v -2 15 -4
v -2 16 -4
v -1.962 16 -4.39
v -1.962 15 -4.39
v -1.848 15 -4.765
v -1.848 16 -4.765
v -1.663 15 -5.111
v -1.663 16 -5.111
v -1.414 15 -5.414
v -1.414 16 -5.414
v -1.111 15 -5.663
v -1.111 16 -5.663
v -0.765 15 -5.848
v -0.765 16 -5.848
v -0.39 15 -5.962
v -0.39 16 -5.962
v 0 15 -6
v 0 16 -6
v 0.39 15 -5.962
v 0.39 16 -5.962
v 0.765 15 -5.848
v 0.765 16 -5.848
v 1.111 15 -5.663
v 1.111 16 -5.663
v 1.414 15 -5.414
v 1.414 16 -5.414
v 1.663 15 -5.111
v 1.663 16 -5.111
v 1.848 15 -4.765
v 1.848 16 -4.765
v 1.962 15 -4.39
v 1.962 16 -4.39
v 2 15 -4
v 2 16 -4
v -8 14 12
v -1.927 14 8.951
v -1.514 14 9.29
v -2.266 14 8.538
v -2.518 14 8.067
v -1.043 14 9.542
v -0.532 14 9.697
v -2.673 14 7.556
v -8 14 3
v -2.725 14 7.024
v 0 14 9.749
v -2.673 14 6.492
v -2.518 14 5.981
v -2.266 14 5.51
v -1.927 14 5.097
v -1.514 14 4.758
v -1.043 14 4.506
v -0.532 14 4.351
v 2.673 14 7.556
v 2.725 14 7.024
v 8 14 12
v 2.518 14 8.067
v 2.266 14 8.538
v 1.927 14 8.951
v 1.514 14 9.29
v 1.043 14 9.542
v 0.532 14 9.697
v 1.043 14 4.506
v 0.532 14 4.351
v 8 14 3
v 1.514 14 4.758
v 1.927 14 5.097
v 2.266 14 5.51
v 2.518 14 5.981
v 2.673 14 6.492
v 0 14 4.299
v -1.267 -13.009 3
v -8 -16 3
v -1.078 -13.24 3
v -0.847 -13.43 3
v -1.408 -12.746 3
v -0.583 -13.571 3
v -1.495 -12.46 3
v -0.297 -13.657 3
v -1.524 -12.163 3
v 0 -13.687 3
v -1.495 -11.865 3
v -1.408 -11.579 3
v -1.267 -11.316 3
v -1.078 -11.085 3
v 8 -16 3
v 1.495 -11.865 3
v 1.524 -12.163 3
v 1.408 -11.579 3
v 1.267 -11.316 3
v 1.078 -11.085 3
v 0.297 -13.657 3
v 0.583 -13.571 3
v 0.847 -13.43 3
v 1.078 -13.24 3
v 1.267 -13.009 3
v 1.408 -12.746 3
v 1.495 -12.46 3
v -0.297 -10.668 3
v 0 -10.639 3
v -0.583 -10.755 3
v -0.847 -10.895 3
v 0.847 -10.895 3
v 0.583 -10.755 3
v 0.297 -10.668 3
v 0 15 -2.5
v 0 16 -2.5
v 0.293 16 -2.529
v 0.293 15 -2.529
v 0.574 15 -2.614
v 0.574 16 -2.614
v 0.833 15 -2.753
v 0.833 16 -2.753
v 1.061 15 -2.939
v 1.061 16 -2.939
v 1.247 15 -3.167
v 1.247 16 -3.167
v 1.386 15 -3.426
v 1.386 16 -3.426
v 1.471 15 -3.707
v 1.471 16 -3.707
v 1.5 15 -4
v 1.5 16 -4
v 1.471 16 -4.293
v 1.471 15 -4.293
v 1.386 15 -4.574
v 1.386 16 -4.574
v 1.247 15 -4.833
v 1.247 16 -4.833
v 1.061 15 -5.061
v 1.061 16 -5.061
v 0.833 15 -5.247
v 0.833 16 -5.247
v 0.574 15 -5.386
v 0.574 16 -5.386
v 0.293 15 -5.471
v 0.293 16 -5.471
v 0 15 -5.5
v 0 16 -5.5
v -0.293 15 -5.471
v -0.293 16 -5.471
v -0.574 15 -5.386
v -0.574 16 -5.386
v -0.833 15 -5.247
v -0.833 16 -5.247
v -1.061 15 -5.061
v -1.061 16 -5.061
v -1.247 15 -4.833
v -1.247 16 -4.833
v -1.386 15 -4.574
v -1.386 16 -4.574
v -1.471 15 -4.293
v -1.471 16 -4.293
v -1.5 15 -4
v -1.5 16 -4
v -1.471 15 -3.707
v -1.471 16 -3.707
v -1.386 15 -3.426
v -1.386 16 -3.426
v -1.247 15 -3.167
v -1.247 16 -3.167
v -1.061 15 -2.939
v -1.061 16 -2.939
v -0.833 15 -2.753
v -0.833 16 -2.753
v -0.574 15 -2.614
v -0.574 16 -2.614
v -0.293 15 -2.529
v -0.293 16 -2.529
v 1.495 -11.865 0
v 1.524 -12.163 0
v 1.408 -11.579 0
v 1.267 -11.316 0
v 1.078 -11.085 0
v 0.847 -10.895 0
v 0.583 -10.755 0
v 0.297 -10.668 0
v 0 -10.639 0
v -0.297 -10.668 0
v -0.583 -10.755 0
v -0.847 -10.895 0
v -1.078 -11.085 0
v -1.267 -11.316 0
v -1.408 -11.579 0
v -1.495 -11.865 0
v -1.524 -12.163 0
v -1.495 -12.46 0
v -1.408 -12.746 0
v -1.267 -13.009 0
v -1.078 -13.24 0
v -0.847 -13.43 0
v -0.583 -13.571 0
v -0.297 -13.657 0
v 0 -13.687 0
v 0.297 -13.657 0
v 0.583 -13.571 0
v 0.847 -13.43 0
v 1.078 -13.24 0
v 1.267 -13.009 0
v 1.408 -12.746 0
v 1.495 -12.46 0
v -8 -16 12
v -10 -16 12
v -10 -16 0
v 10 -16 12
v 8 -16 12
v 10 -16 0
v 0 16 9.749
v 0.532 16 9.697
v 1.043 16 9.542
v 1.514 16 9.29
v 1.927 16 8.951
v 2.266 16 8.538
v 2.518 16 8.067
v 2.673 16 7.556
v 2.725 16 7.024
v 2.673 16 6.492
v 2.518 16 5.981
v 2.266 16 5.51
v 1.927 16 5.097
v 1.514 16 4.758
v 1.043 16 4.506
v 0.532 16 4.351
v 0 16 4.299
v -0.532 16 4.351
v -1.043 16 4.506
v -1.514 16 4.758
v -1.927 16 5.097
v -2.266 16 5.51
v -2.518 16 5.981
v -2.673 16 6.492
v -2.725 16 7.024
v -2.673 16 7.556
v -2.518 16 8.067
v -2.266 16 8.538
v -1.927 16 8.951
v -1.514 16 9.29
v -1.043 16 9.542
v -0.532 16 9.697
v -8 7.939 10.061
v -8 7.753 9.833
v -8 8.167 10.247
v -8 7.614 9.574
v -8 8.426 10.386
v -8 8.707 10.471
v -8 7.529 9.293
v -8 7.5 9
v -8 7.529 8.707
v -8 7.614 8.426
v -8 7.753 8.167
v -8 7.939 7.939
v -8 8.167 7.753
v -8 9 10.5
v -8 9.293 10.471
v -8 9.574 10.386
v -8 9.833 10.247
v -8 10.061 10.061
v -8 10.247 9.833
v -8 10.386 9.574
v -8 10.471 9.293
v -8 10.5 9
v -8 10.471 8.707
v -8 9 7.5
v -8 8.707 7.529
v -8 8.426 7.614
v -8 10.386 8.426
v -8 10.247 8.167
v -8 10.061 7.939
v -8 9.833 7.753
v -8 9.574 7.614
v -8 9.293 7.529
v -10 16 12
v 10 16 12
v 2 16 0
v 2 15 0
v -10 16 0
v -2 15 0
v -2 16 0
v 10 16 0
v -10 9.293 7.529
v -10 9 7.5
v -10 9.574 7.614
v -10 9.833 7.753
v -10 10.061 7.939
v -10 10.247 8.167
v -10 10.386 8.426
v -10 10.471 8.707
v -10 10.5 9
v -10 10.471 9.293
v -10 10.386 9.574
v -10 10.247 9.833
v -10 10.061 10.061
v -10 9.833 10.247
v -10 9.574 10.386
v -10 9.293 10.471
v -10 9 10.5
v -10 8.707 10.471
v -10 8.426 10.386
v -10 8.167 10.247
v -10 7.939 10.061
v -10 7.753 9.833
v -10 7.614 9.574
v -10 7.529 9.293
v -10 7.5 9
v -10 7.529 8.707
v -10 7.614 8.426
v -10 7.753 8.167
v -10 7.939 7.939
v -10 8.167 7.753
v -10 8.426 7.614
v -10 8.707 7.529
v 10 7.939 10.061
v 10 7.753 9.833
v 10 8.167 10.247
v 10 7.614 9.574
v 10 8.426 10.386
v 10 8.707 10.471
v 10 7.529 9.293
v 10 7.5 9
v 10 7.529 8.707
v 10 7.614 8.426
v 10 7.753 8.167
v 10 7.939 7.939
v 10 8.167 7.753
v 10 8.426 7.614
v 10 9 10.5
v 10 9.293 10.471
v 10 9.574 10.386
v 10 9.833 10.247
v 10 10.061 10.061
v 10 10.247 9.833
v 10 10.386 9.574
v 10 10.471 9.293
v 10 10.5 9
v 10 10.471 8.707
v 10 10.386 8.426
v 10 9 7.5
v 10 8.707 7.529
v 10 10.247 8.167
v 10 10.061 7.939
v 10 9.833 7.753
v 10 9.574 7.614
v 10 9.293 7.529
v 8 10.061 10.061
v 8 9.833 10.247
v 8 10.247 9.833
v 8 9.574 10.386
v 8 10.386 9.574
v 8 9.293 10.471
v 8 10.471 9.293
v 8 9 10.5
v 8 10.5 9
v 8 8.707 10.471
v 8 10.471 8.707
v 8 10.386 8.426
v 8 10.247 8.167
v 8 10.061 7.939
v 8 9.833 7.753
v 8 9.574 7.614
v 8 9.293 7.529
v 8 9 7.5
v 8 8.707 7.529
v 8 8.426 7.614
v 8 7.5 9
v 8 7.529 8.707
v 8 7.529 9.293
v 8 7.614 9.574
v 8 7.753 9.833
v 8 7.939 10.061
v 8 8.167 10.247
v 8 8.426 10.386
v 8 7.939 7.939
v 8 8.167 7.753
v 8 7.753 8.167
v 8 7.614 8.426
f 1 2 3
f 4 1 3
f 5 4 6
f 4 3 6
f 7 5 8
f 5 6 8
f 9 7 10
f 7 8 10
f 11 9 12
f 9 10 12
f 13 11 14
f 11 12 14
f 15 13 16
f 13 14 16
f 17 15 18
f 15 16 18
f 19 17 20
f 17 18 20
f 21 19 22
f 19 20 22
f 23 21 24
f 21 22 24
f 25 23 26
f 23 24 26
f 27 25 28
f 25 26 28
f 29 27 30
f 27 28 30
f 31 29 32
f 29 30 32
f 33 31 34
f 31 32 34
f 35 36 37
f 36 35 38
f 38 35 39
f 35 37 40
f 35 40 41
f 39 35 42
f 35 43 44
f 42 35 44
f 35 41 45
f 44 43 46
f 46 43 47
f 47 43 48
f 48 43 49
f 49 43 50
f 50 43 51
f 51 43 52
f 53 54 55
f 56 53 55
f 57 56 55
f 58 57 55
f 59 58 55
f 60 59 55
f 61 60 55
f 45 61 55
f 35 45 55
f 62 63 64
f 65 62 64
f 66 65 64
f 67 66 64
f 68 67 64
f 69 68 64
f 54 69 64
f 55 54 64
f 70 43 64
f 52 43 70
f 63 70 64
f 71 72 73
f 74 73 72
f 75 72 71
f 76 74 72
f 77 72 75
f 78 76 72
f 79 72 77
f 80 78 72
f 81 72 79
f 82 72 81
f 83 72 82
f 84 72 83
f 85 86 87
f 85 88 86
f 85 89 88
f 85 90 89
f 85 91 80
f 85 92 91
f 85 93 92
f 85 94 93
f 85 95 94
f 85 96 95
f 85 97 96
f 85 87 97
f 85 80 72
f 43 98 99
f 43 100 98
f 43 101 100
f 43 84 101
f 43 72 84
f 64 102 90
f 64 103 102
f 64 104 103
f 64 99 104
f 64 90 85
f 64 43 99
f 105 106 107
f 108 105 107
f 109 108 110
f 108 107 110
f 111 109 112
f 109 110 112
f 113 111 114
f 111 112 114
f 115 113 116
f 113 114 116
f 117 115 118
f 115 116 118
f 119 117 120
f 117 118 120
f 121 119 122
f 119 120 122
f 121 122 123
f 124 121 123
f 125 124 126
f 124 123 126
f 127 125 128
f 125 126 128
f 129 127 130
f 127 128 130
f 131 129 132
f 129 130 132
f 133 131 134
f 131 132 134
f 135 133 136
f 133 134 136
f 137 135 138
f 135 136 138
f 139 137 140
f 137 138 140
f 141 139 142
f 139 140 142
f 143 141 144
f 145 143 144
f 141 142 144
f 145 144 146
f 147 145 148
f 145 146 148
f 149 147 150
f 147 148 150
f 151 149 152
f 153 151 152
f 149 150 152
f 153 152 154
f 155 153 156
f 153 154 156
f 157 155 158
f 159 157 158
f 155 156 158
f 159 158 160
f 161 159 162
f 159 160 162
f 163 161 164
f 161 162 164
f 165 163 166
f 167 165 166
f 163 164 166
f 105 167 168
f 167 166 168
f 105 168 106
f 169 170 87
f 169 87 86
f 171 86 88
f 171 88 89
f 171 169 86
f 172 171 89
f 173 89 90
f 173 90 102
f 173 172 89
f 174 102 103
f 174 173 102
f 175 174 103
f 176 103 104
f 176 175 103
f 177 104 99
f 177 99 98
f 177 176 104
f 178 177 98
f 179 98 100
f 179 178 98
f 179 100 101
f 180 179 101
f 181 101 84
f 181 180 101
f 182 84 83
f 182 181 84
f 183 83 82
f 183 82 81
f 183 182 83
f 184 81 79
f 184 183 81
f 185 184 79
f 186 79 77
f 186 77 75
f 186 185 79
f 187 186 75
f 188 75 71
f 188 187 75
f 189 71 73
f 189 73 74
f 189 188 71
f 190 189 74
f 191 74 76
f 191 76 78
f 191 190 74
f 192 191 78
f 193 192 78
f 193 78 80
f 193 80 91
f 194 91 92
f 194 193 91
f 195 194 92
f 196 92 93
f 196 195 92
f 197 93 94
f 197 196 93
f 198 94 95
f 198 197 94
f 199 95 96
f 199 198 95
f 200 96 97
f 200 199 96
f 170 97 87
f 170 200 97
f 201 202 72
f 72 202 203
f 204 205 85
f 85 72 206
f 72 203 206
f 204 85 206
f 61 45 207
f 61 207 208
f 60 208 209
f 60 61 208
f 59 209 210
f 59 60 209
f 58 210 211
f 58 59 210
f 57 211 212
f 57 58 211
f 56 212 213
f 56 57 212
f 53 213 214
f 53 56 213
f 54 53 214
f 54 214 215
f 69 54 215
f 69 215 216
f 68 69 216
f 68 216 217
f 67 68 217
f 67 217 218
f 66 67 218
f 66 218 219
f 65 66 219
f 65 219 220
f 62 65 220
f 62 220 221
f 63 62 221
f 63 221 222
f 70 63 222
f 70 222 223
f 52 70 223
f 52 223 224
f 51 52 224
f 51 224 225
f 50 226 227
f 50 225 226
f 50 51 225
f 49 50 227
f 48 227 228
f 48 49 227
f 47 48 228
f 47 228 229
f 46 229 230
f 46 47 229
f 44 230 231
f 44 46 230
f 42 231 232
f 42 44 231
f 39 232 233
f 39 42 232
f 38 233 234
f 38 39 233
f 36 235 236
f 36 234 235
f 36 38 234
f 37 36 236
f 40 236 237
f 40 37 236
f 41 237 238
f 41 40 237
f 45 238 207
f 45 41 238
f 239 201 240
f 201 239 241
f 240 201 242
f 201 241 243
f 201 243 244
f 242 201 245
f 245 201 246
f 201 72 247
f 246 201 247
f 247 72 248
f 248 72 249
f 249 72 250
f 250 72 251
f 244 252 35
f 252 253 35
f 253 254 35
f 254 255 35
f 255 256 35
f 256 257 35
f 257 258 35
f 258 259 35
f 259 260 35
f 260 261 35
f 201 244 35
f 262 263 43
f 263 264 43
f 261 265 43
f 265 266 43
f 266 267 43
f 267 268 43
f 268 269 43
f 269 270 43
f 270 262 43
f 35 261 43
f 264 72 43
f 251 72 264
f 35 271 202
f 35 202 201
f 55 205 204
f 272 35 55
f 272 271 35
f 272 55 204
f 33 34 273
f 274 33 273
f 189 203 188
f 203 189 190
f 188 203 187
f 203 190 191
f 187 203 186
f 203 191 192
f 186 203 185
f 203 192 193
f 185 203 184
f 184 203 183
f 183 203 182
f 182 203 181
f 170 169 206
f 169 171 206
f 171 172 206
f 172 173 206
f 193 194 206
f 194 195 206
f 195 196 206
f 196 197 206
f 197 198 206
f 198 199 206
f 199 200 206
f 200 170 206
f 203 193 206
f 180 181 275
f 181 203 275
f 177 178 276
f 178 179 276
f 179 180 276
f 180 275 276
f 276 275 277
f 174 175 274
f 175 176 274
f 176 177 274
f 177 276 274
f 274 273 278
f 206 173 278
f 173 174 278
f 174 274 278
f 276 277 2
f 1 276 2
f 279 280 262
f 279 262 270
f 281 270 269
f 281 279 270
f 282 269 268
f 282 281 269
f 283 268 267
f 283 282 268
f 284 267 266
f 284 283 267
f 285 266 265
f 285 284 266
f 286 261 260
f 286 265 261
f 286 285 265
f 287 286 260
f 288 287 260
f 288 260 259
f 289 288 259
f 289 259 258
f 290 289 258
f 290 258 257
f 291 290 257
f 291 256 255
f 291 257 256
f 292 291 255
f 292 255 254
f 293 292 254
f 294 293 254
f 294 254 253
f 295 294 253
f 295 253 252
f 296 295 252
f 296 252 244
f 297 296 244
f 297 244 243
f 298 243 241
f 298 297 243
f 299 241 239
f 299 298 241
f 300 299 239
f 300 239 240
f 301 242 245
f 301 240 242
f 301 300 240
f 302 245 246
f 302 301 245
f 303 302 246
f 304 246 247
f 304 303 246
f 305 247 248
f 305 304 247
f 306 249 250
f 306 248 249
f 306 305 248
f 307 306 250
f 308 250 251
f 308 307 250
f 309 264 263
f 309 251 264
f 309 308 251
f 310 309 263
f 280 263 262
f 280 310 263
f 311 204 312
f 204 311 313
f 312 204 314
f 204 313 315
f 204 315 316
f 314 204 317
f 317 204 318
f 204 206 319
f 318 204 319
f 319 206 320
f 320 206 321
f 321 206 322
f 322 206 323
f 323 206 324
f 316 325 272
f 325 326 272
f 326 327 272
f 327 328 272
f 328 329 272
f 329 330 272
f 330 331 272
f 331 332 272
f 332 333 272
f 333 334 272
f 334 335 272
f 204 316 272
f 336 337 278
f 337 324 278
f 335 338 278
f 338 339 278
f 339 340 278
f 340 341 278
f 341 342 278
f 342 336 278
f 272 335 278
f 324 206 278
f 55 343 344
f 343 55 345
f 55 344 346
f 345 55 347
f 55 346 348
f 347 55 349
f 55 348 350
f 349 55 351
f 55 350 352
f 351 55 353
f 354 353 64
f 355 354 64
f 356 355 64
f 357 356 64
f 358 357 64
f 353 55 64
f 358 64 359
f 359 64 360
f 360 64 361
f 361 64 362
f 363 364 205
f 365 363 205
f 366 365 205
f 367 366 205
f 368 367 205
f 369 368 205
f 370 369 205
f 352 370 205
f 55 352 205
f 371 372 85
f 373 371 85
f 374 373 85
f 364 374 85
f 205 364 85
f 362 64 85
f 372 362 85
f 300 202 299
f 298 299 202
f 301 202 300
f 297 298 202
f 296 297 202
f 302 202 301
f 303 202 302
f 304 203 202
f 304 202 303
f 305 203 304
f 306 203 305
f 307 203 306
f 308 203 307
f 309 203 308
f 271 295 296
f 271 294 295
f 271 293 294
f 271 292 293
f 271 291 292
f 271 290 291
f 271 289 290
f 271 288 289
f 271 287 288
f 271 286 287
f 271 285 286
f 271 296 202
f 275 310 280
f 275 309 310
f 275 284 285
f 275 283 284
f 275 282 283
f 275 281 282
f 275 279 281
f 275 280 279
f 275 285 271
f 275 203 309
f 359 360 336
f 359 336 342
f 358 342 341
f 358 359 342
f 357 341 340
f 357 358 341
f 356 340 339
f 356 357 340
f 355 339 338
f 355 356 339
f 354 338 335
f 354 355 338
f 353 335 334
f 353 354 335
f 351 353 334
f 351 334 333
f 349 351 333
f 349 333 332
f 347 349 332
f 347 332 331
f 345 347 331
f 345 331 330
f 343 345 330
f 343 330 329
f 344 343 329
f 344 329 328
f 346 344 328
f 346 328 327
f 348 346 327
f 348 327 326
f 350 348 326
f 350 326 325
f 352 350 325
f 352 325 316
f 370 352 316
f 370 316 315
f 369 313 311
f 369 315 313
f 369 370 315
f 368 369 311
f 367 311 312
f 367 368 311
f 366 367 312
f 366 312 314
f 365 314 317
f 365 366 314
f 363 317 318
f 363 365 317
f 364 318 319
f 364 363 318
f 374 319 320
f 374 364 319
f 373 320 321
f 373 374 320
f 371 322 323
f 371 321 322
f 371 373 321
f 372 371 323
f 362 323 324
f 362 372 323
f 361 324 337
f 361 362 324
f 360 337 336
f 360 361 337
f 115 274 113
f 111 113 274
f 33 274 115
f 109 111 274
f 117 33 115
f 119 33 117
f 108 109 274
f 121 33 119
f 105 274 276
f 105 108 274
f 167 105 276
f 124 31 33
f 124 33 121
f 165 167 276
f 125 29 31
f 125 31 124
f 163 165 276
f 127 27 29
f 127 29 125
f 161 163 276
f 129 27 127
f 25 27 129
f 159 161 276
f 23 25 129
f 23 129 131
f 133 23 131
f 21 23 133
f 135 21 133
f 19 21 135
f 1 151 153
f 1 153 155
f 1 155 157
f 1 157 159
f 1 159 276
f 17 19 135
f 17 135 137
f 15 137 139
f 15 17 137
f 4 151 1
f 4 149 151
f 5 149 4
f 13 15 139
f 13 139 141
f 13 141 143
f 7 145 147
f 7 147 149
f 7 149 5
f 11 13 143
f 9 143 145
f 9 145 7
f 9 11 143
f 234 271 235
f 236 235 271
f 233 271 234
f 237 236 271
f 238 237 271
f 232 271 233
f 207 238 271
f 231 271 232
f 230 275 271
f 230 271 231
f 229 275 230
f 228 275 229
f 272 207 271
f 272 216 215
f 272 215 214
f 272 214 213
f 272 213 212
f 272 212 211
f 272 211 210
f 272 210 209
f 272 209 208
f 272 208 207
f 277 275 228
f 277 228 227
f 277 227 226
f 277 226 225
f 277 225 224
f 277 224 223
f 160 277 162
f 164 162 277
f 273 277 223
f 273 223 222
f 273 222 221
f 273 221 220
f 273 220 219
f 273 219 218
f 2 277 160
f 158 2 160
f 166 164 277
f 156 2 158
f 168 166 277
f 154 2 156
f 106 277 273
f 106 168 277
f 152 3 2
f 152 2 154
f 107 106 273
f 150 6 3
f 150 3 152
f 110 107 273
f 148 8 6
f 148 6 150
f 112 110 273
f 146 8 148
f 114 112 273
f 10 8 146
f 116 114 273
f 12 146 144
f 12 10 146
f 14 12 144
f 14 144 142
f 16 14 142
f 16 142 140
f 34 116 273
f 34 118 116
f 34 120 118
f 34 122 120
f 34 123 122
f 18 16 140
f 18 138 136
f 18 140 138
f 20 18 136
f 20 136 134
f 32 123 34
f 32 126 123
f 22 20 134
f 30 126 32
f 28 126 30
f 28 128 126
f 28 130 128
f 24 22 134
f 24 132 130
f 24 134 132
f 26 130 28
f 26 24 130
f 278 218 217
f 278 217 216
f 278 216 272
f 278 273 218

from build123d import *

# Parameters (mm, degrees)
ESQUISSE1_W                  = 20
ESQUISSE1_H                  = 32
ESQUISSE1_R                  = 1.524
BOSS_EXTRU_1_DEPTH           = 3
BOSS_EXTRU_2_DEPTH           = 12
ENL_V_MAT_EXTRU_1_DEPTH      = 23.360679775
ENL_V_MAT_EXTRU_1_DEPTH_BACK = 23.360679775
ESQUISSE3_R                  = 2.725
ENL_V_MAT_EXTRU_2_DEPTH      = 23.360679775
ENL_V_MAT_EXTRU_2_DEPTH_BACK = 23.360679775
ESQUISSE4_R                  = 1.5
ESQUISSE5_R                  = 1.5
BOSS_EXTRU_3_DEPTH           = 1


with BuildPart() as part:
    # Esquisse1 → Boss.-Extru.1 (new body)
    with BuildSketch(Plane.XY):
        Rectangle(ESQUISSE1_W, ESQUISSE1_H)
        with Locations((0, -12.162643372)):
            Circle(ESQUISSE1_R, mode=Mode.SUBTRACT)
    extrude(amount=BOSS_EXTRU_1_DEPTH)

    # Esquisse2 → Boss.-Extru.2 (add)
    with BuildSketch(Plane.XY):
        Polygon((8, -16), (10, -16), (10, 16), (-10, 16), (-10, -16), (-8, -16), (-8, 14), (8, 14), align=None)
    extrude(amount=BOSS_EXTRU_2_DEPTH)

    # Esquisse3 → Enlèv. mat.-Extru.1 (cut, two sides: drawn at the far end of the back side and taken through both)
    with BuildSketch(Plane(origin=(0, 0, 0), x_dir=(1, 0, 0), z_dir=(0, 1, 0)).offset(-ENL_V_MAT_EXTRU_1_DEPTH_BACK)):
        with Locations(Location((0, -7.024, 0), (0, 0, 270))):
            Circle(ESQUISSE3_R)
    extrude(amount=ENL_V_MAT_EXTRU_1_DEPTH + ENL_V_MAT_EXTRU_1_DEPTH_BACK, mode=Mode.SUBTRACT)

    # Esquisse4 → Enlèv. mat.-Extru.2 (cut, two sides: drawn at the far end of the back side and taken through both)
    with BuildSketch(Plane(origin=(0, 0, 0), x_dir=(0, 0, -1), z_dir=(1, 0, 0)).offset(-ENL_V_MAT_EXTRU_2_DEPTH_BACK)):
        with Locations((-9, 9)):
            Circle(ESQUISSE4_R)
    extrude(amount=ENL_V_MAT_EXTRU_2_DEPTH + ENL_V_MAT_EXTRU_2_DEPTH_BACK, mode=Mode.SUBTRACT)

    # Esquisse5 → Boss.-Extru.3 (add)
    with BuildSketch(Plane(origin=(0, 16, 0), x_dir=(1, 0, 0), z_dir=(0, 1, 0))):
        with BuildLine():
            Line((-2, 0), (-2, 4))
            ThreePointArc((-2, 4), (0, 6), (2, 4))
            Line((2, 4), (2, 0))
            Line((2, 0), (-2, 0))
        make_face()
        with Locations(Location((0, 4, 0), (0, 0, 270))):
            Circle(ESQUISSE5_R, mode=Mode.SUBTRACT)
    extrude(amount=-BOSS_EXTRU_3_DEPTH)


solid = part.part
